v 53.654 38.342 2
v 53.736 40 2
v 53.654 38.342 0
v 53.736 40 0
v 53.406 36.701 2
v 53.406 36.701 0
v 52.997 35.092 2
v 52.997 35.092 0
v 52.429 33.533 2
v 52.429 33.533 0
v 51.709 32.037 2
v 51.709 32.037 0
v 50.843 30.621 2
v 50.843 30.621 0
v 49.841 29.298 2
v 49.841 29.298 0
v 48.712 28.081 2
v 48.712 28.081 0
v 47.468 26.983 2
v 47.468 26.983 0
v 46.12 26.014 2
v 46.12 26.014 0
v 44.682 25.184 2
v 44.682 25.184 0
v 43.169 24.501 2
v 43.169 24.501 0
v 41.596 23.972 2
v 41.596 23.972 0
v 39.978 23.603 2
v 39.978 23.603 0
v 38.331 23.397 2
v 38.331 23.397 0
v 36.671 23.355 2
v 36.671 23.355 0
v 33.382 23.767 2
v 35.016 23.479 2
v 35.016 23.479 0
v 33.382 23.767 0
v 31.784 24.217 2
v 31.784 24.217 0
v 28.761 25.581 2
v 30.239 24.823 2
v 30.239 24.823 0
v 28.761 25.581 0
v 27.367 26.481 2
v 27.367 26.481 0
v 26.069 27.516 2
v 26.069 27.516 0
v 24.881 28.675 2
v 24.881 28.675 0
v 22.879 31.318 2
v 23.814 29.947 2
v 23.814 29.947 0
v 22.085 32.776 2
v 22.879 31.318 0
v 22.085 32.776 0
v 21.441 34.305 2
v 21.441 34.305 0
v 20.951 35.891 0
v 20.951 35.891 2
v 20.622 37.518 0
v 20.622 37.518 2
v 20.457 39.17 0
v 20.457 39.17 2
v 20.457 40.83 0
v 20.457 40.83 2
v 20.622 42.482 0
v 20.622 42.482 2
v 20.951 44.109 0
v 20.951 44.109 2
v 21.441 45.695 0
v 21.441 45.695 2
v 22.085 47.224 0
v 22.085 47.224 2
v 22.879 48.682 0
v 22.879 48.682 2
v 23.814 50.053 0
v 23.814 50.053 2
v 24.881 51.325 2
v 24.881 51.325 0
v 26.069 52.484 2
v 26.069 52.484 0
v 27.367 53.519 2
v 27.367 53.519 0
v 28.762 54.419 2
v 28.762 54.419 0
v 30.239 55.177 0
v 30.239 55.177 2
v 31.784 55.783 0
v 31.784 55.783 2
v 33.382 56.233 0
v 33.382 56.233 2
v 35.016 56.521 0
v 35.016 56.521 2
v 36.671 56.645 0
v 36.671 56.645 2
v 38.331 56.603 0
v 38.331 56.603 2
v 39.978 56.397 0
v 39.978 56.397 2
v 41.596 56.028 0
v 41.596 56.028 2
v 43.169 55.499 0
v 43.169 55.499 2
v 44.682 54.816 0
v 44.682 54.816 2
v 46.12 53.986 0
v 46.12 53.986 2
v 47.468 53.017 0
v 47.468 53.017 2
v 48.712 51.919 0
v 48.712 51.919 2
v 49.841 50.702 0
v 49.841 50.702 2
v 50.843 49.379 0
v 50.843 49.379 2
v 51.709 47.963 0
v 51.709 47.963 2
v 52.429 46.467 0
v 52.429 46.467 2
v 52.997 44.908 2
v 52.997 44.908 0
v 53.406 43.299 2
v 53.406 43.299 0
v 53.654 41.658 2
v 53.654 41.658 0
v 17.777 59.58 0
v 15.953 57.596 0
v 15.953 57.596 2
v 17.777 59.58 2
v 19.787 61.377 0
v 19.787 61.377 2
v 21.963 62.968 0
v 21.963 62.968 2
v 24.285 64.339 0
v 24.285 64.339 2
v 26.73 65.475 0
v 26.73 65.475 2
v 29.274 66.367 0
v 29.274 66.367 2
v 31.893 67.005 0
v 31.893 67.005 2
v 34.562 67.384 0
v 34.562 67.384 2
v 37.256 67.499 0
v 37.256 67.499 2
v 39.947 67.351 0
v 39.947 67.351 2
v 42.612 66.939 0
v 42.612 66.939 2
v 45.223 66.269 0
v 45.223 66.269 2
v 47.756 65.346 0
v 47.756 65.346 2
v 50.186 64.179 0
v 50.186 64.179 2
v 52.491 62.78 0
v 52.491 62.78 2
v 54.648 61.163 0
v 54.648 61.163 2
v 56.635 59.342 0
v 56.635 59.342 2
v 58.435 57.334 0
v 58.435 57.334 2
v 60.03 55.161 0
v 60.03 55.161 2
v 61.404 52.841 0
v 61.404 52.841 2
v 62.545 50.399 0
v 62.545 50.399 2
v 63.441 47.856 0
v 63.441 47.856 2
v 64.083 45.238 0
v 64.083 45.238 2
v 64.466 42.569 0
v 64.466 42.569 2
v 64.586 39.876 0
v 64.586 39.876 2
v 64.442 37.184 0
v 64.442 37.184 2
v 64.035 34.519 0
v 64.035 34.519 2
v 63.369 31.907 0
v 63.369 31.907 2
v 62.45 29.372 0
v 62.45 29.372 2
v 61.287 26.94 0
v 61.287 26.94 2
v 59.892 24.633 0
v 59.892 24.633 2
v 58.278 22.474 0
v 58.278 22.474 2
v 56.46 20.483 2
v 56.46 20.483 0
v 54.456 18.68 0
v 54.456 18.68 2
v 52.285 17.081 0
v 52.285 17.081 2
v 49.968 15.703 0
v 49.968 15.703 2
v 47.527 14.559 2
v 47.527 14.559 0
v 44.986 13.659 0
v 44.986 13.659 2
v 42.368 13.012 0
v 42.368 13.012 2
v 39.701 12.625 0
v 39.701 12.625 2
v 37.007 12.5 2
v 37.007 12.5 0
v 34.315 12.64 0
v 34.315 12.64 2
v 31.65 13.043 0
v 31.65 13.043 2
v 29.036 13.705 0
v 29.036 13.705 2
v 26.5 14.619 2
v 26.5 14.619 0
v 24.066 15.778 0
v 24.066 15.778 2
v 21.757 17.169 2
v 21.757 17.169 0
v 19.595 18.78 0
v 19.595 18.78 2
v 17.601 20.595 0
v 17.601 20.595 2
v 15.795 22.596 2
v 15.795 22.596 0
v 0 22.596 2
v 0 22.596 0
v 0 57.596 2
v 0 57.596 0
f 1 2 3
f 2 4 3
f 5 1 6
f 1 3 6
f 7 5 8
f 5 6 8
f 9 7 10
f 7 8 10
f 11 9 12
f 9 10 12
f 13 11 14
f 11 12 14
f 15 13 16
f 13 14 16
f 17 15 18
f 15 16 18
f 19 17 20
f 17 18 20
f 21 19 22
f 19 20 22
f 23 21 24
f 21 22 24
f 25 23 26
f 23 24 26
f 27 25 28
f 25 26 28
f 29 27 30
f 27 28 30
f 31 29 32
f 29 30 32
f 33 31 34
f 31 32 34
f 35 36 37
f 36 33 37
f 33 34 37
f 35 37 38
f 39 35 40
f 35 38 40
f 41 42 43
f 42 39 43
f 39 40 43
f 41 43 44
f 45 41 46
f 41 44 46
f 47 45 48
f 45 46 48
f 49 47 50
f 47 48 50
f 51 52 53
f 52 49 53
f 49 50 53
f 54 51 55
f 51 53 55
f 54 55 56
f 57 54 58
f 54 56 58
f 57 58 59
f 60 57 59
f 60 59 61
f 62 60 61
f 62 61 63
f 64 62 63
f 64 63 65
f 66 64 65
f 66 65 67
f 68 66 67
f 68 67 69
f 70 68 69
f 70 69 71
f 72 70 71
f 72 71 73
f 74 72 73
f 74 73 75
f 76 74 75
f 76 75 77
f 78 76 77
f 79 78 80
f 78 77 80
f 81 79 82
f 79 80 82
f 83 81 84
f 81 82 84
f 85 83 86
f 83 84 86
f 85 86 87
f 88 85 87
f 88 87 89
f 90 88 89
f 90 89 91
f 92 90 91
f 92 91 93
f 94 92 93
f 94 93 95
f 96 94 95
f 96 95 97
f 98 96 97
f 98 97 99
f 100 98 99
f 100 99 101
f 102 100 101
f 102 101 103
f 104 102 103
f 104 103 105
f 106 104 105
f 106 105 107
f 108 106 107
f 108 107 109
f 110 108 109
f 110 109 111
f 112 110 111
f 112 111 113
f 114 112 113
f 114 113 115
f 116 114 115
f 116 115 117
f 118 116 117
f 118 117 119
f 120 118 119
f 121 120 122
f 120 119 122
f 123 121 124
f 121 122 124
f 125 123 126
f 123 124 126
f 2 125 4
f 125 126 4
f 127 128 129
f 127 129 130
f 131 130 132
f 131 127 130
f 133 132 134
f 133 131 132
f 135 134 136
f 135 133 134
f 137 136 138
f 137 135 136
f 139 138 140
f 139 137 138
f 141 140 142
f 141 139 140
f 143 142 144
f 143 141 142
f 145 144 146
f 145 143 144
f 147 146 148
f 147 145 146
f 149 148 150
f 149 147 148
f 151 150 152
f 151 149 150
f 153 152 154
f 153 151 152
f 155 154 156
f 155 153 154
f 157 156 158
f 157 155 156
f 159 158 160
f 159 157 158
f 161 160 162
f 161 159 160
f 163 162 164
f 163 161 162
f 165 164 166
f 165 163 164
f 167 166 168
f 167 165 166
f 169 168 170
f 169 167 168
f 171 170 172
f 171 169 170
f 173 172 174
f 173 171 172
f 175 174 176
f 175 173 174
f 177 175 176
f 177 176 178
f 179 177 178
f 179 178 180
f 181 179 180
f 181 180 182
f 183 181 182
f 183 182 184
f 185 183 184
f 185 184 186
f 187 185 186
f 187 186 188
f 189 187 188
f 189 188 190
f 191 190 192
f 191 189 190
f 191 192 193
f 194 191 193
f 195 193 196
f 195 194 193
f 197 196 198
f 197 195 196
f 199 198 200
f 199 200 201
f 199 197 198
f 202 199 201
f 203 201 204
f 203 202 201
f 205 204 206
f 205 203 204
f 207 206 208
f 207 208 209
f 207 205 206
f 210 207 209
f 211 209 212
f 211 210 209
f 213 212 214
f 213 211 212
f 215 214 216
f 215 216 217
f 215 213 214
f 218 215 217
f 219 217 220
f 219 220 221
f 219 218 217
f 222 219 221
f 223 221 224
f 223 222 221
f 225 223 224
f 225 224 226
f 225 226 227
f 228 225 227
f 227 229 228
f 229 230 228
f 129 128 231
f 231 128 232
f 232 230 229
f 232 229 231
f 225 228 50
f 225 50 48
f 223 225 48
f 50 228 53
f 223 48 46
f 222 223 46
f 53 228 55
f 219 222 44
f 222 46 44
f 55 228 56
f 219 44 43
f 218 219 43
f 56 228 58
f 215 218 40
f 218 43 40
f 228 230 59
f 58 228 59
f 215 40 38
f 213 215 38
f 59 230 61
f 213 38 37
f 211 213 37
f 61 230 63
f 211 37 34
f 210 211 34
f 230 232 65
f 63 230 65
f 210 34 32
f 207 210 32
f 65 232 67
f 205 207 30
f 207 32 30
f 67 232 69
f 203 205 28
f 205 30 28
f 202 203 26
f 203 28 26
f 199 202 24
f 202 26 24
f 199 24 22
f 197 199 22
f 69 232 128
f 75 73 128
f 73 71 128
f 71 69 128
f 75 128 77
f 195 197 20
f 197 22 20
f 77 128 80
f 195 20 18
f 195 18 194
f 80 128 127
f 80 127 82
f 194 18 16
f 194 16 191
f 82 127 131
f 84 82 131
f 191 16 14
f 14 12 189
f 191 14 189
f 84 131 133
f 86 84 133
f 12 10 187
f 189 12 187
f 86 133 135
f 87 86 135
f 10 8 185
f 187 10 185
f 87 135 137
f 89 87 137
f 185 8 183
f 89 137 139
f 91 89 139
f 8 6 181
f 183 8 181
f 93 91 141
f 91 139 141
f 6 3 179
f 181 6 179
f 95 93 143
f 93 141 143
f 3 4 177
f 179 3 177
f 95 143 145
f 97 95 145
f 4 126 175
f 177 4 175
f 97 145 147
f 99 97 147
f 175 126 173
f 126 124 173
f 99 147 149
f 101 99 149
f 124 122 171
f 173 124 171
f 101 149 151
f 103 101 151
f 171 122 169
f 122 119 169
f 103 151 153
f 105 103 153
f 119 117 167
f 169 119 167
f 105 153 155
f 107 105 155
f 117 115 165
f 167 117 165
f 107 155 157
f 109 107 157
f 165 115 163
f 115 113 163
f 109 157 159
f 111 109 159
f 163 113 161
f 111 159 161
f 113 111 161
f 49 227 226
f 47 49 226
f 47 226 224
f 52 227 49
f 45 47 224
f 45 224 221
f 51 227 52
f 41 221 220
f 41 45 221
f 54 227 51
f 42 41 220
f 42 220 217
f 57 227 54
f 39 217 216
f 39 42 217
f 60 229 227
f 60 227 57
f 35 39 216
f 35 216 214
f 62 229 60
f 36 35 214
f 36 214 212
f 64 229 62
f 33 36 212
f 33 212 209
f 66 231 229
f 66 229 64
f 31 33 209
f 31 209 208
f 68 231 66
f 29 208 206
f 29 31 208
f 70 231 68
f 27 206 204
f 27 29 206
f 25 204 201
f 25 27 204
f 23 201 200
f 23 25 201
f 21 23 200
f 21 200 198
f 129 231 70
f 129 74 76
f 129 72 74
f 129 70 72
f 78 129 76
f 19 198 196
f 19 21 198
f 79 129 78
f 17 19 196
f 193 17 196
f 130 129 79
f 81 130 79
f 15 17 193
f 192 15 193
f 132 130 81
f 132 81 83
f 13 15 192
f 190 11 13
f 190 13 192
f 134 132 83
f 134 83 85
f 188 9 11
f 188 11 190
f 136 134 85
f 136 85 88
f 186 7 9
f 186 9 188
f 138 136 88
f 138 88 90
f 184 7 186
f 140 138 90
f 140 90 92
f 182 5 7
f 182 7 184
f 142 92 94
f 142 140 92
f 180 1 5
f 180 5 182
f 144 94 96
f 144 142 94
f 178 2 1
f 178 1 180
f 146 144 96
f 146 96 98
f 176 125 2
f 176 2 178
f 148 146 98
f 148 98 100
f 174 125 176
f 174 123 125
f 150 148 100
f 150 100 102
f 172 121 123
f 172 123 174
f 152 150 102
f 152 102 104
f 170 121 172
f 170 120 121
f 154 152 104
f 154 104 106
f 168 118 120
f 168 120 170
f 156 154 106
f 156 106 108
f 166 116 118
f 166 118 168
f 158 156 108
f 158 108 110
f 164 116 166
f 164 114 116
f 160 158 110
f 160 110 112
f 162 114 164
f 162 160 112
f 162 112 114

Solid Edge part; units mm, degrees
sketch "Sketch1" plane through (0, 0, 0) normal (0, 0, 1) x (1, 0, 0)
  line L0 (15.9526, 57.5957) -> (0, 57.5957)
  line L1 (0, 22.5957) -> (0, 57.5957)
  line L2 (0, 22.5957) -> (15.7947, 22.5957)
  arc A0 (15.9526, 57.5957) -> (15.7947, 22.5957) centre (37.0865, 40) cw
  circle A1 centre (37.0865, 40) radius 16.65
extrude "Protrusion1" add sketch "Sketch1" along normal blind 2
